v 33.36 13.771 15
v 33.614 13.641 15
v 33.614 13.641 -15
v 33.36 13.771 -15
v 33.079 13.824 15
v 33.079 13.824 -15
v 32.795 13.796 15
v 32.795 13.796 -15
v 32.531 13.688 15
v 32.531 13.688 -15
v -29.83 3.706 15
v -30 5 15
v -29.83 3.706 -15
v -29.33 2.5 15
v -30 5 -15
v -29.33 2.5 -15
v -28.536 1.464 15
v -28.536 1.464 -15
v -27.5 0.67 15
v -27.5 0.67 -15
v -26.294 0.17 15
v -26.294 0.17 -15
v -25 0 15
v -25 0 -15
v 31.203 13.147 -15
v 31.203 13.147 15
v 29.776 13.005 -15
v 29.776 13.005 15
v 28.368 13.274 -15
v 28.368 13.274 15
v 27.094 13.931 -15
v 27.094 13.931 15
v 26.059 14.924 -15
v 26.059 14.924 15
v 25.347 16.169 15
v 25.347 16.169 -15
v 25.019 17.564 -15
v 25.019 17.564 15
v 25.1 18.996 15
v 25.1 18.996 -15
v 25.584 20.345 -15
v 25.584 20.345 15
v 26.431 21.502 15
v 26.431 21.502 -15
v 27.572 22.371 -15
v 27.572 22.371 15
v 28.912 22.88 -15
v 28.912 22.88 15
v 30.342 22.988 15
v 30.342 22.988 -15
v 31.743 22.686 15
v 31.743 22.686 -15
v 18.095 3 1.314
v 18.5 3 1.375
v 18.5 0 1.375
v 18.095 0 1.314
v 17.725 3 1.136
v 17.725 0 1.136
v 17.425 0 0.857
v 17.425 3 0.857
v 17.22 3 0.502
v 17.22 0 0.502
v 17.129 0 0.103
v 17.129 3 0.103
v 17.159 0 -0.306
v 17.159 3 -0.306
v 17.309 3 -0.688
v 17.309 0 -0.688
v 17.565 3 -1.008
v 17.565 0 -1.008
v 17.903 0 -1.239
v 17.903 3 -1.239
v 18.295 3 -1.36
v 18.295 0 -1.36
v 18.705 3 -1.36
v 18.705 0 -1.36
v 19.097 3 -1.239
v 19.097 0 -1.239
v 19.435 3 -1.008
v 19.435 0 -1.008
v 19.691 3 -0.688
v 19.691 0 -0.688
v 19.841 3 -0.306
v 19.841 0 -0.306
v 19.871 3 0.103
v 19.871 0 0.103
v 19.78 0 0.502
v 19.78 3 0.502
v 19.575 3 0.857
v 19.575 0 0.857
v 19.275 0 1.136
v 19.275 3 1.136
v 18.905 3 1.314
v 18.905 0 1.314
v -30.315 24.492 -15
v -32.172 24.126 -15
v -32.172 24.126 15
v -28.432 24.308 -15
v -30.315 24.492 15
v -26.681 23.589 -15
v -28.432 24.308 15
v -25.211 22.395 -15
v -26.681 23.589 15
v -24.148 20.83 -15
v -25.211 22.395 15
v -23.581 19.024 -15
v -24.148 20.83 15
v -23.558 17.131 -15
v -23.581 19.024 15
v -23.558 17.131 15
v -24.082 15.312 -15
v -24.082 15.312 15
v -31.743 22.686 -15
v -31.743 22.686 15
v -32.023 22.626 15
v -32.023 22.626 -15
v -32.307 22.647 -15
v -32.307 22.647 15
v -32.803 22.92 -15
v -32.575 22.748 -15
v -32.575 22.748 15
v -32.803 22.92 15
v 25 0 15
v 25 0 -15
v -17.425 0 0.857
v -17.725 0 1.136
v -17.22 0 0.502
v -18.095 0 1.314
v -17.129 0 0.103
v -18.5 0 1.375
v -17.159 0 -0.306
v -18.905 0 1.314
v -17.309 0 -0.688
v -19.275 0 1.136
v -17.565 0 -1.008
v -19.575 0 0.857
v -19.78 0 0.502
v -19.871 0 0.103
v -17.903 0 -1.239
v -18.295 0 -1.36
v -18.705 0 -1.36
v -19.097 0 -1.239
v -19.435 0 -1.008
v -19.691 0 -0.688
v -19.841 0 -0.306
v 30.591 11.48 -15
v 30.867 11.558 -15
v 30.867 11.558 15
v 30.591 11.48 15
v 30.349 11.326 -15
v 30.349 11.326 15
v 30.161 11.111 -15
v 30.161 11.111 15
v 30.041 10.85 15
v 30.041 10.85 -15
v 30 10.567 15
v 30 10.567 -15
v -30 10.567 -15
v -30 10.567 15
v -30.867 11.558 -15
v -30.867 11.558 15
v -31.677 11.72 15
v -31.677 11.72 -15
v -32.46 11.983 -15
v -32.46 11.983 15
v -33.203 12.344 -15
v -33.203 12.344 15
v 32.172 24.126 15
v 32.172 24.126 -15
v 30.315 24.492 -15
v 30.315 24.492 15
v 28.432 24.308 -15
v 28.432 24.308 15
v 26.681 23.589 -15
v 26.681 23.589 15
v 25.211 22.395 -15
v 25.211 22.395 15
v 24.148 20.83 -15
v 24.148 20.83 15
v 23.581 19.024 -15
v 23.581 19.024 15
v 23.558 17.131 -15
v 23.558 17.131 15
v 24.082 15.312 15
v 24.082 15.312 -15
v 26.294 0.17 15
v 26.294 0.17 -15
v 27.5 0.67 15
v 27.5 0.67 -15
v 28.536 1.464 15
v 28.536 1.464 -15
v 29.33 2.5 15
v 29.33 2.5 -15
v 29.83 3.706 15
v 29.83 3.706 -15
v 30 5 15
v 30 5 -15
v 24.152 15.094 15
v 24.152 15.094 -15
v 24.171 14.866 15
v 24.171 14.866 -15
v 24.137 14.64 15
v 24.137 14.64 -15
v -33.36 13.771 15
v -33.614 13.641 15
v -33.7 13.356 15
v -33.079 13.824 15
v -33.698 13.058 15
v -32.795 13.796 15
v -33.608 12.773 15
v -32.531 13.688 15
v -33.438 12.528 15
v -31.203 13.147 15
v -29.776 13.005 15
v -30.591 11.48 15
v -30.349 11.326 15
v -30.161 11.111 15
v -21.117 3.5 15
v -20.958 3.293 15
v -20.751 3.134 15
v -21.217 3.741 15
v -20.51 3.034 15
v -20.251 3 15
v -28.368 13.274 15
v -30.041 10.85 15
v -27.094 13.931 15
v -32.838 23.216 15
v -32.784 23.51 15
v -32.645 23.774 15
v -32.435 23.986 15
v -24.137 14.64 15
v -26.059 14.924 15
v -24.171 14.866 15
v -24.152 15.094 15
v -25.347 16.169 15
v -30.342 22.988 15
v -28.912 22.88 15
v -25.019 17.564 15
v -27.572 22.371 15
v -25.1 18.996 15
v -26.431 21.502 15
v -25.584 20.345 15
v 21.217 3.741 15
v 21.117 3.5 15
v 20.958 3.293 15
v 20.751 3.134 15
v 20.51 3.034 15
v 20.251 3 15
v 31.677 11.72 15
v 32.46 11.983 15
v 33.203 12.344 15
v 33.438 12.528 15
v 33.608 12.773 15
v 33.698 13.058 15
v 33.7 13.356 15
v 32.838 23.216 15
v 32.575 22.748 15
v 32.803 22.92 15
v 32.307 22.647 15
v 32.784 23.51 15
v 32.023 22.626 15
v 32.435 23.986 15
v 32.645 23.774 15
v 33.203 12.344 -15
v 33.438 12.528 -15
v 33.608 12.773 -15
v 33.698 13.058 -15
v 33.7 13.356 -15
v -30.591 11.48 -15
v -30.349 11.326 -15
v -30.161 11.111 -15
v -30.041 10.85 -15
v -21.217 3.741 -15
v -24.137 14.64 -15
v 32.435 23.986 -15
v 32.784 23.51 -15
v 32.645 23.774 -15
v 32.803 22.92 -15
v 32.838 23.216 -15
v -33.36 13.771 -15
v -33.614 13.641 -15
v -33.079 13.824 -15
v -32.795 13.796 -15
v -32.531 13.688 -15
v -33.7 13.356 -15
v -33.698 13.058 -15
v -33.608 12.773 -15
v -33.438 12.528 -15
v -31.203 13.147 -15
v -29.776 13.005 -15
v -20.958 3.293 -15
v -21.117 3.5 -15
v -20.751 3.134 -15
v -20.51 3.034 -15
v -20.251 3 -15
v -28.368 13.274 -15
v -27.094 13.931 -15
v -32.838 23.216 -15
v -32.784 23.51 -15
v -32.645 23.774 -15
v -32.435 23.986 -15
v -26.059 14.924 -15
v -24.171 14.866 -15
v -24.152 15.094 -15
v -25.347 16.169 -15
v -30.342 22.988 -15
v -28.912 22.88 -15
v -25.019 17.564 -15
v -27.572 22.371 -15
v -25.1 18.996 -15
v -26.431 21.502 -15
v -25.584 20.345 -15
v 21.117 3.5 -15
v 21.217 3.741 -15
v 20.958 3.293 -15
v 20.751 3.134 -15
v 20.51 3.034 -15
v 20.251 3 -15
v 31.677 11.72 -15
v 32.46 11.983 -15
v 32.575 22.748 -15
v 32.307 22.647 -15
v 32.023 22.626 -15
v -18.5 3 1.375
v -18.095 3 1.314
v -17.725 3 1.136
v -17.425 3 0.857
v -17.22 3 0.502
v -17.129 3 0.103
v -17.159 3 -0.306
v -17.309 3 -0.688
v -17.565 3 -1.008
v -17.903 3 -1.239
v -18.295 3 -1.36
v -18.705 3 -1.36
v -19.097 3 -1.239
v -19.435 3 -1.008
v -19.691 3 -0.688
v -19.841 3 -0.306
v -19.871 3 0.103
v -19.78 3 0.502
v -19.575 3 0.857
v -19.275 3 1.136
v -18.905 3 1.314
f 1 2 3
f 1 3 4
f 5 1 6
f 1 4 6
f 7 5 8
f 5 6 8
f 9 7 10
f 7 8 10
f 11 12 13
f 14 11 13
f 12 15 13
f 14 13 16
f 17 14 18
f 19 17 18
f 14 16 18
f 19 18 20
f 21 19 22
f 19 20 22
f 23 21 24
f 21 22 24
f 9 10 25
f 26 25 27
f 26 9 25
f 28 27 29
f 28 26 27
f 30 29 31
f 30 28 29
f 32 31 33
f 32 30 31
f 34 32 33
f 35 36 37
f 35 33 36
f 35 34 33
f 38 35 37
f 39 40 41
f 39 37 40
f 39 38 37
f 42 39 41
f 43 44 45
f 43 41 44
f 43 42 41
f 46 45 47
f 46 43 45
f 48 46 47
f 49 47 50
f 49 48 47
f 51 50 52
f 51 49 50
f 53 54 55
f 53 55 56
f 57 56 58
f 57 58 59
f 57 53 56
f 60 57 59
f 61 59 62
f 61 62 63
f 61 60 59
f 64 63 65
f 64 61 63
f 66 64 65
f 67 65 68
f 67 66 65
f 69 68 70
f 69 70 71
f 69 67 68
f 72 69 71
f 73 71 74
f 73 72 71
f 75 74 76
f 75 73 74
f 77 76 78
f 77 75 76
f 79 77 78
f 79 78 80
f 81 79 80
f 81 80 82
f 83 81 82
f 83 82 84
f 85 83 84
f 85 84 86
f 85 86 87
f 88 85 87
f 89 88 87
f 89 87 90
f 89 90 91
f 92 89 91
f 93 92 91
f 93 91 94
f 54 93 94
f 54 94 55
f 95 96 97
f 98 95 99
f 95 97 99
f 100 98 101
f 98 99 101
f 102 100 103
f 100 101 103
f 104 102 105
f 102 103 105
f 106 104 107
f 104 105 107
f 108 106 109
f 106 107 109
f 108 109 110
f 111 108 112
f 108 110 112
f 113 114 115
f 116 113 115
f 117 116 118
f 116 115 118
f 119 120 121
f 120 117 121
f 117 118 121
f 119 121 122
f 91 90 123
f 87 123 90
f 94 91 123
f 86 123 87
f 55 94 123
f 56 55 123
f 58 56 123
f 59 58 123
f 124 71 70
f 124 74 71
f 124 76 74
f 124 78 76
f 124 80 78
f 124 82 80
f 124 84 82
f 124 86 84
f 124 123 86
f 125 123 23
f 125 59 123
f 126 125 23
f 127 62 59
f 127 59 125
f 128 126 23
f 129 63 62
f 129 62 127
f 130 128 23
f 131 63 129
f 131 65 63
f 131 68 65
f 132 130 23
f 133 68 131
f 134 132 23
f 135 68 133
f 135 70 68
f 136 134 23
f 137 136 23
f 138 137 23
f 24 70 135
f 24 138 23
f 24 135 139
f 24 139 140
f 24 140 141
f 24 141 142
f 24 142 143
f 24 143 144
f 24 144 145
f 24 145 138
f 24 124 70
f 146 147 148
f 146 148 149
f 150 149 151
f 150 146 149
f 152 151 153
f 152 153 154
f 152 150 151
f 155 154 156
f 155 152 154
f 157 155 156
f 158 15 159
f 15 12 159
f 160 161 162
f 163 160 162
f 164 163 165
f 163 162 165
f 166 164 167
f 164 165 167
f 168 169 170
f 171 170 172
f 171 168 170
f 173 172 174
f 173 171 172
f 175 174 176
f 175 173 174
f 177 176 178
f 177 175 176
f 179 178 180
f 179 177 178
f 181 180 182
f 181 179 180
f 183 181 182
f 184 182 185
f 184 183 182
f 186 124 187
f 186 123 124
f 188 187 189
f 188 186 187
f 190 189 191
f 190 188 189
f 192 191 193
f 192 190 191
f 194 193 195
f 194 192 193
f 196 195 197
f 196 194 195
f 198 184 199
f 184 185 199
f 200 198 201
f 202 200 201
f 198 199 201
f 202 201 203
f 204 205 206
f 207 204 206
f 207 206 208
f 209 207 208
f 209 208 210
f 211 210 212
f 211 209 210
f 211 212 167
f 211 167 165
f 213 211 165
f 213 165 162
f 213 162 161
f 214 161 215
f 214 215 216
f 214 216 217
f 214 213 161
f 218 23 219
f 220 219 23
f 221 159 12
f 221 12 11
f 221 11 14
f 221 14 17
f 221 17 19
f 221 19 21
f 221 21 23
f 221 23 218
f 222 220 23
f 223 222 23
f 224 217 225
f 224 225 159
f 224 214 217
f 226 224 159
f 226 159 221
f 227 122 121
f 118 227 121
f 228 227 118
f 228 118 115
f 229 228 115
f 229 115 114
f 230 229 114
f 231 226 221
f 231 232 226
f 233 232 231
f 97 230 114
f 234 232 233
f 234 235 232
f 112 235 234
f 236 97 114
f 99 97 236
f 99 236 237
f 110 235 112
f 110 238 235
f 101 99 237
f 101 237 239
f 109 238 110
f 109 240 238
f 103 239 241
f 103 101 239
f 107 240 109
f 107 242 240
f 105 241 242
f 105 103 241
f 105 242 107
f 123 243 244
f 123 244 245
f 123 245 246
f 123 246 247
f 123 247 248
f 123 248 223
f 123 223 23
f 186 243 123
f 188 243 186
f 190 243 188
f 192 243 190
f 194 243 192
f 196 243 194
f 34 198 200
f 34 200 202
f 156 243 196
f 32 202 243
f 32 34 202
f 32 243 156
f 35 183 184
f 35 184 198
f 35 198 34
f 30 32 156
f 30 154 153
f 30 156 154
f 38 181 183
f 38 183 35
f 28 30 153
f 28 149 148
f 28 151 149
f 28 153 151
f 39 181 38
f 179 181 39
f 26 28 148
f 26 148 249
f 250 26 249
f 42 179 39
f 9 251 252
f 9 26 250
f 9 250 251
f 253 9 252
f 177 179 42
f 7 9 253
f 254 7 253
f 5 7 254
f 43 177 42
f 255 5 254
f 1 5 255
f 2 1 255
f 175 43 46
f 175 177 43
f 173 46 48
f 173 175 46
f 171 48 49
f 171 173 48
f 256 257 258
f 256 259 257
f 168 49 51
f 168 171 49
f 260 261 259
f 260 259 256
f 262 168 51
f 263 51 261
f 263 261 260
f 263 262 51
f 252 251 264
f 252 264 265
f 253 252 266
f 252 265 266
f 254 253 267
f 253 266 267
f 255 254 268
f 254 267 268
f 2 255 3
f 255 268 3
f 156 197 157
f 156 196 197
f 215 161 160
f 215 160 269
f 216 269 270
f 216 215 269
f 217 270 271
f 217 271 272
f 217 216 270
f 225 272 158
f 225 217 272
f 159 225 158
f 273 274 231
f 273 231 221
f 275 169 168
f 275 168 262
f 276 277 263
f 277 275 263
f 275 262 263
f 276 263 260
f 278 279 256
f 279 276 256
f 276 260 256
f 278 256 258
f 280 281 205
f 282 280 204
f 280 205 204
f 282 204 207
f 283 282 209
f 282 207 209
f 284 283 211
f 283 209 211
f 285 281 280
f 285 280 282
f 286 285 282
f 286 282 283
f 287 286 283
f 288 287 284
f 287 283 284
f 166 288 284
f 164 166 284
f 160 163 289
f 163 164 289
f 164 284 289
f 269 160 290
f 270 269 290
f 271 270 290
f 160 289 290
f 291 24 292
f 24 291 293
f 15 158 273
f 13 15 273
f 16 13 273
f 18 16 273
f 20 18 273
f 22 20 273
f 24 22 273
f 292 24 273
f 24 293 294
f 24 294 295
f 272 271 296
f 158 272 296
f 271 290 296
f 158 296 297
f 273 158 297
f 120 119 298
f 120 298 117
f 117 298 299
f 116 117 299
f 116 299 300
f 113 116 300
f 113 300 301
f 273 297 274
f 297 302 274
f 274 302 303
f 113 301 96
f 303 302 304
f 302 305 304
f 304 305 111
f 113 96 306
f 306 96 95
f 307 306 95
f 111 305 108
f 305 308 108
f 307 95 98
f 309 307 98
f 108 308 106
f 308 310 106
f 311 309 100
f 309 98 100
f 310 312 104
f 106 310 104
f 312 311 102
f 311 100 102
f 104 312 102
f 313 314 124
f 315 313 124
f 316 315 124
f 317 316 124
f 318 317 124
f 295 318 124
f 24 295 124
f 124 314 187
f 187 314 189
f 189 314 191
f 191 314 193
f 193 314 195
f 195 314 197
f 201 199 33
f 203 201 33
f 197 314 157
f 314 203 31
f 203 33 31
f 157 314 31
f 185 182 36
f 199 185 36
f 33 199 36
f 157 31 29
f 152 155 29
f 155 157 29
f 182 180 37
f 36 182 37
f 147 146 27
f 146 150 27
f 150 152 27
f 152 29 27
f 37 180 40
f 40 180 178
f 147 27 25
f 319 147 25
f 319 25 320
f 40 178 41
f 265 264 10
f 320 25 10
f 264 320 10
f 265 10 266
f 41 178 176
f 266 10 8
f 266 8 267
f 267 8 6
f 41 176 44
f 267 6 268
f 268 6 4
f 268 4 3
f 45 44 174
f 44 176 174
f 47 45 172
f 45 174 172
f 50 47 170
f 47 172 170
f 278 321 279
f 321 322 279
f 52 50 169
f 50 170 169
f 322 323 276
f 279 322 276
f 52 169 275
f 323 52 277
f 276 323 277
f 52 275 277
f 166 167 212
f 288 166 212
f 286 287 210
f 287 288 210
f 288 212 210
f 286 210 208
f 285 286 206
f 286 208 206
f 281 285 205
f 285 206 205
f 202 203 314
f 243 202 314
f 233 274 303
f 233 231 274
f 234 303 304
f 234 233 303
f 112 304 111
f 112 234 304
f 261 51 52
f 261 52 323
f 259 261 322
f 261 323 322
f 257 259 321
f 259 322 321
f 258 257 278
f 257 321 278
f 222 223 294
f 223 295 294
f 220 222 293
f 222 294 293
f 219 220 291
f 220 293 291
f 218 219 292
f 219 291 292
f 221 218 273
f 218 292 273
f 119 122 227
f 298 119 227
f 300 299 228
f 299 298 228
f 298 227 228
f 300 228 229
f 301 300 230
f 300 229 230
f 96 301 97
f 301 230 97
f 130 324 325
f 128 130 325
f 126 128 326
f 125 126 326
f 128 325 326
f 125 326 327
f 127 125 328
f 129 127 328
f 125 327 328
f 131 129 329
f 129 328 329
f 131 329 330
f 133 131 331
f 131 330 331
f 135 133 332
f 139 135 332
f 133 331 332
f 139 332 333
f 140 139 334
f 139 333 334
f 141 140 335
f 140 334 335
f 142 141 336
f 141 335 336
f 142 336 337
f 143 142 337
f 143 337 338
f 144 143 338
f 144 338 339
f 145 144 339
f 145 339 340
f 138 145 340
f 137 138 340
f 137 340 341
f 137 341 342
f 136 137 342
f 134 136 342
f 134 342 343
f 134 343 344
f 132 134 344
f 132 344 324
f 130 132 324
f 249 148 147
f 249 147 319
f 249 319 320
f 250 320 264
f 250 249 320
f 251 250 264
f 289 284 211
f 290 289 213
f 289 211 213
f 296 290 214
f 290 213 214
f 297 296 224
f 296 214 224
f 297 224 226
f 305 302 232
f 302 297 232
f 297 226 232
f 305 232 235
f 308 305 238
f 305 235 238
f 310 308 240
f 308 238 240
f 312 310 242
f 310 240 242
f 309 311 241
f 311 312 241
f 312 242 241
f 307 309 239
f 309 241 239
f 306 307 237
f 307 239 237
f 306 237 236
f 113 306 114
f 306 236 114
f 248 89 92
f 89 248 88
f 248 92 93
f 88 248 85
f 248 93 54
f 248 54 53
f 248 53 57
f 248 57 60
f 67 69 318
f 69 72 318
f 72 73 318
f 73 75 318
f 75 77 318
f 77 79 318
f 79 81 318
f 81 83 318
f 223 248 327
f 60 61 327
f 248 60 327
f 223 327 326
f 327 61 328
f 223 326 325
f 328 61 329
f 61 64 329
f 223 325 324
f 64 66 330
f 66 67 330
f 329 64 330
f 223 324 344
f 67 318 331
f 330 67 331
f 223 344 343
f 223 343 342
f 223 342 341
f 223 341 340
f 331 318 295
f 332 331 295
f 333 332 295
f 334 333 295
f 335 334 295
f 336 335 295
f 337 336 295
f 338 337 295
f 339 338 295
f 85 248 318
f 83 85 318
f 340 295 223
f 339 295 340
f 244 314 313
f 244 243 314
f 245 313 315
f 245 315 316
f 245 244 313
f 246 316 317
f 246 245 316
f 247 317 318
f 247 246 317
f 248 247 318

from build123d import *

# Parameters (mm, degrees)
BOSS_EXTRUDE1_DEPTH             = 3
CUT_EXTRUDE1_REACH              = 35.675
SKETCH2_R                       = 1.3750000000000009
BOSS_EXTRUDE2_REACH             = 35.675
BOSS_EXTRUDE2_DIRECTION_2_REACH = 35.675
FILLET3_R                       = 1
FILLET3_OF_MIRROR2_R            = 1
FILLET6_R                       = 5
FILLET7_R                       = 1


with BuildPart() as part:
    # Sketch1 → Boss-Extrude1 (new body)
    with BuildSketch(Plane(origin=(0, 0, 0), x_dir=(1, 0, 0), z_dir=(0, 1, 0))):
        Polygon((30, -14.999999999999993), (-29.999999999999996, -15.000000000000002), (-29.999999999999996, 14.999999999999998), (30.000000000000004, 15.000000000000005), align=None)
    extrude(amount=BOSS_EXTRUDE1_DEPTH)

    # Sketch2 → Cut-Extrude1 (cut, up to next)
    with BuildSketch(Plane(origin=(0, 3, 0), x_dir=(1, 0, 0), z_dir=(0, 1, 0)), mode=Mode.PRIVATE) as cut_extrude1_sk1:
        with Locations(Location((-18.5, 0, 0), (0, 0, 270))):
            Circle(SKETCH2_R)
    cut_extrude1_tool1 = extrude(cut_extrude1_sk1.sketch, amount=-CUT_EXTRUDE1_REACH, mode=Mode.PRIVATE) & part.part
    cut_extrude1 = cut_extrude1_tool1.solids().sort_by_distance((-18.5, 3, 0))[0]
    add(cut_extrude1, mode=Mode.SUBTRACT)

    # Mirror1: Cut-Extrude1 across plane
    add(cut_extrude1.mirror(Plane(origin=(0, 0, 0), x_dir=(0, 0, 1), z_dir=(1, 0, 0))), mode=Mode.SUBTRACT)

    # Boss-Extrude2: up to this face of the body (flat: up to its plane)
    boss_extrude2_end = Plane(part.part.faces().sort_by_distance((0, 1.5, 15))[0])
    # Sketch3 → Boss-Extrude2 (add, up to the picked face)
    with BuildSketch(Plane.XY, mode=Mode.PRIVATE) as boss_extrude2_sk1:
        with BuildLine():
            Line((24.23371870266459, 15.000000000000002), (21.01832839349107, 3))
            Line((21.01832839349107, 3), (30, 3))
            Line((30, 3), (29.999999999999996, 11.500000000107407))
            ThreePointArc((29.999999999999996, 11.500000000107407), (32.223130931464034, 11.891997965331278), (34.17811946267373, 13.020711120091907))
            Line((34.17811946267373, 13.020711120091907), (33.213938048141515, 14.169777784768357))
            ThreePointArc((33.213938048141515, 14.169777784768357), (25.019026509541703, 17.564221286256522), (32.50000000000003, 22.3301270189222))
            Line((32.50000000000003, 22.3301270189222), (33.250000000000036, 23.62916512459886))
            ThreePointArc((33.250000000000036, 23.62916512459886), (25.505721350569345, 22.695898148519827), (24.23371870266459, 15.000000000000002))
        make_face()
    boss_extrude2_tool1 = split(extrude(boss_extrude2_sk1.sketch, amount=BOSS_EXTRUDE2_REACH, mode=Mode.PRIVATE), bisect_by=boss_extrude2_end, keep=Keep.BOTH, mode=Mode.PRIVATE)
    boss_extrude2 = boss_extrude2_tool1.solids().sort_by(Axis((26.59731, 11.034621, 0), (0, 0, 1)))[0]
    add(boss_extrude2)

    # Boss-Extrude2 direction 2: up to this face of the body (flat: up to its plane)
    boss_extrude2_direction_2_end = Plane(part.part.faces().sort_by_distance((0, 1.5, -15))[0])
    # Sketch3 → Boss-Extrude2 direction 2 (add, up to the picked face)
    with BuildSketch(Plane.XY, mode=Mode.PRIVATE) as boss_extrude2_direction_2_sk1:
        with BuildLine():
            Line((24.23371870266459, 15.000000000000002), (21.01832839349107, 3))
            Line((21.01832839349107, 3), (30, 3))
            Line((30, 3), (29.999999999999996, 11.500000000107407))
            ThreePointArc((29.999999999999996, 11.500000000107407), (32.223130931464034, 11.891997965331278), (34.17811946267373, 13.020711120091907))
            Line((34.17811946267373, 13.020711120091907), (33.213938048141515, 14.169777784768357))
            ThreePointArc((33.213938048141515, 14.169777784768357), (25.019026509541703, 17.564221286256522), (32.50000000000003, 22.3301270189222))
            Line((32.50000000000003, 22.3301270189222), (33.250000000000036, 23.62916512459886))
            ThreePointArc((33.250000000000036, 23.62916512459886), (25.505721350569345, 22.695898148519827), (24.23371870266459, 15.000000000000002))
        make_face()
    boss_extrude2_direction_2_tool1 = split(extrude(boss_extrude2_direction_2_sk1.sketch, amount=-BOSS_EXTRUDE2_DIRECTION_2_REACH, mode=Mode.PRIVATE), bisect_by=boss_extrude2_direction_2_end, keep=Keep.BOTH, mode=Mode.PRIVATE)
    boss_extrude2_direction_2 = boss_extrude2_direction_2_tool1.solids().sort_by(Axis((26.59731, 11.034621, 0), (0, 0, -1)))[0]
    add(boss_extrude2_direction_2)

    # Fillet3
    # the kernel refuses this fillet: 1 mm, written as the material it adds along each edge
    with BuildSketch(Plane(origin=(29.999999999999996, 11.500000000107406, -15.000000000000002), x_dir=(0.9977653155349889, 0.06681597949116533, 0), z_dir=(0, 0, 1))) as fillet3_piece_1:
        with BuildLine():
            CenterArc((0.9354237099720605, -0.99776531555048), FILLET3_R, 93.83112782826316, 82.33774433018942)
            Line((-0.06234160556292847, -0.9309493360593146), (0, 0))
            ThreePointArc((0, 0), (0.4343038653561172, -0.01452544892746713), (0.8686077307122309, -1e-17))
        make_face()
    extrude(amount=30)
    # the kernel refuses this fillet: 1 mm, written as the material it takes off along each edge
    with BuildSketch(Plane(origin=(33.250000000000036, 23.62916512459886, 17.96693441323381), x_dir=(-0.9080543065649367, 0.4188524517403138, 0), z_dir=(0, 0, -1))) as fillet3_2_piece_1:
        with BuildLine():
            CenterArc((1.0954834756555598, -0.995824323371254), FILLET3_R, 84.76215915180506, 100.47568169639004)
            Line((0.09965915228430783, -1.0871146130092202), (0, 0))
            ThreePointArc((0, 0), (0.5933868826467665, 0.02714189808684594), (1.1867737652935233, 0))
        make_face()
    extrude(amount=35.93386882646762, mode=Mode.SUBTRACT)
    with BuildSketch(Plane(origin=(32.50000000000003, 22.3301270189222, -17.290199457863853), x_dir=(0.5000000000000039, 0.8660254037844365, 0), z_dir=(0, 0, 1))) as fillet3_2_piece_2:
        with BuildLine():
            CenterArc((0.9160797831455422, 0.9999999999999977), FILLET3_R, 189.59406822434758, 80.40593177565233)
            ThreePointArc((-0.06993351404503671, 0.8333333333765751), (-0.01751405270363253, 0.41813130141934185), (0, 0))
            Line((0, 0), (0.9160797831455412, -3e-17))
        make_face()
    extrude(amount=34.5803989157277, mode=Mode.SUBTRACT)
    with BuildSketch(Plane(origin=(34.17811946267373, 13.02071112009191, -17.96693441327771), x_dir=(-0.6427876096881444, 0.7660444431176312, 0), z_dir=(0, 0, 1))) as fillet3_2_piece_3:
        with BuildLine():
            CenterArc((1.0916730868583728, 1.0000000000000009), FILLET3_R, 169.52431830288586, 100.47568169711377)
            ThreePointArc((0.1083409208250382, 1.1818181818306124), (0.02714189812493758, 0.5933868826533465), (0, 0))
            Line((0, 0), (1.0916730868583666, -2e-17))
        make_face()
    extrude(amount=35.93386882655541, mode=Mode.SUBTRACT)
    with BuildSketch(Plane(origin=(33.213938048141515, 14.169777784768355, -17.29019945772614), x_dir=(-0.8171150585222966, -0.5764746144767381, 0), z_dir=(0, 0, 1))) as fillet3_2_piece_4:
        with BuildLine():
            CenterArc((0.9198888630675175, 0.9964971894548403), FILLET3_R, 184.7970341139915, 80.40593177249599)
            Line((-0.0766083263866242, 0.9128709291653951), (0, 0))
            ThreePointArc((0, 0), (0.4181313013932034, 0.01751405272528074), (0.8362626027864033, 2e-17))
        make_face()
    extrude(amount=34.58039891545228, mode=Mode.SUBTRACT)

    # Mirror2: Boss-Extrude2, Boss-Extrude2 direction 2 across plane
    add(boss_extrude2.mirror(Plane(origin=(0, 0, 0), x_dir=(0, 0, 1), z_dir=(1, 0, 0))))
    add(boss_extrude2_direction_2.mirror(Plane(origin=(0, 0, 0), x_dir=(0, 0, 1), z_dir=(1, 0, 0))))

    # Fillet3 of Mirror2
    # the kernel refuses this fillet: 1 mm, written as the material it adds along each edge
    with BuildSketch(Plane(origin=(-29.999999999999996, 11.500000000107406, 14.999999999999998), x_dir=(-0.9977653155349889, 0.06681597949116533, 0), z_dir=(0, 0, -1))) as fillet3_of_mirror2_piece_1:
        with BuildLine():
            CenterArc((0.9354237099720605, -0.99776531555048), FILLET3_OF_MIRROR2_R, 93.83112782826316, 82.33774433018942)
            Line((-0.06234160556292847, -0.9309493360593146), (0, 0))
            ThreePointArc((0, 0), (0.4343038653561172, -0.01452544892746713), (0.8686077307122309, -1e-17))
        make_face()
    extrude(amount=30)
    # the kernel refuses this fillet: 1 mm, written as the material it takes off along each edge
    with BuildSketch(Plane(origin=(-33.250000000000036, 23.629165124598856, 17.966934413233812), x_dir=(0.5000000000000044, -0.866025403784436, 0), z_dir=(0, 0, -1))) as fillet3_of_mirror2_2_piece_1:
        with BuildLine():
            CenterArc((1.0916730868040134, -1.0000000000000007), FILLET3_OF_MIRROR2_R, 90.00000000000007, 100.47568169639015)
            ThreePointArc((0.10834092076838271, -1.181818181818188), (0.02714189808684512, -0.5933868826467682), (0, 0))
            Line((0, 0), (1.091673086804012, -2e-17))
        make_face()
    extrude(amount=35.93386882646763, mode=Mode.SUBTRACT)
    with BuildSketch(Plane(origin=(-32.50000000000003, 22.3301270189222, 17.29019945786385), x_dir=(0.9048050109861938, 0.42582612894733674, 0), z_dir=(0, 0, -1))) as fillet3_of_mirror2_2_piece_2:
        with BuildLine():
            CenterArc((0.9198888631228366, -0.996497189454418), FILLET3_OF_MIRROR2_R, 94.79703411380164, 80.40593177565235)
            Line((-0.07660832633633094, -0.9128709292248977), (0, 0))
            ThreePointArc((0, 0), (0.41813130141834665, -0.01751405272739198), (0.8362626028366937, -2e-17))
        make_face()
    extrude(amount=34.5803989157277, mode=Mode.SUBTRACT)
    with BuildSketch(Plane(origin=(-34.17811946267373, 13.020711120091908, 17.966934413277702), x_dir=(0.8215259563306123, -0.5701711173630887, 0), z_dir=(0, 0, -1))) as fillet3_of_mirror2_2_piece_3:
        with BuildLine():
            CenterArc((1.0954834757069158, -0.995824323374353), FILLET3_OF_MIRROR2_R, 84.76215915375006, 100.47568169711377)
            Line((0.09965915233991275, -1.0871146130587033), (0, 0))
            ThreePointArc((0, 0), (0.59338688265553, 0.02714189807715625), (1.1867737653110744, 8e-17))
        make_face()
    extrude(amount=35.9338688265554, mode=Mode.SUBTRACT)
    with BuildSketch(Plane(origin=(-33.213938048141515, 14.169777784768355, 17.290199457726136), x_dir=(-0.6427876096881426, -0.7660444431176326, 0), z_dir=(0, 0, -1))) as fillet3_of_mirror2_2_piece_4:
        with BuildLine():
            CenterArc((0.916079783090449, -1.0000000000000009), FILLET3_OF_MIRROR2_R, 89.99999999999977, 80.40593177249599)
            ThreePointArc((-0.06993351409094786, -0.8333333333222552), (-0.01751405272878019, -0.4181313013930569), (0, 0))
            Line((0, 0), (0.916079783090453, 2e-17))
        make_face()
    extrude(amount=34.58039891545228, mode=Mode.SUBTRACT)

    # Fillet6
    fillet6_edges = [part.edges().sort_by_distance(p)[0] for p in [
        (30, 0, -5.33e-15),
        (-29.999999999999996, 0, 1.78e-15),
    ]]
    fillet(fillet6_edges, radius=FILLET6_R)

    # Fillet7
    fillet7_edges = [part.edges().sort_by_distance(p)[0] for p in [
        (21.01832839349107, 3, -1.78e-15),
        (24.23371870266459, 15.000000000000004, -1.78e-15),
        (-24.23371870266459, 15.000000000000004, -1.78e-15),
        (-21.01832839349107, 3, -1.78e-15),
    ]]
    fillet(fillet7_edges, radius=FILLET7_R)


solid = part.part
